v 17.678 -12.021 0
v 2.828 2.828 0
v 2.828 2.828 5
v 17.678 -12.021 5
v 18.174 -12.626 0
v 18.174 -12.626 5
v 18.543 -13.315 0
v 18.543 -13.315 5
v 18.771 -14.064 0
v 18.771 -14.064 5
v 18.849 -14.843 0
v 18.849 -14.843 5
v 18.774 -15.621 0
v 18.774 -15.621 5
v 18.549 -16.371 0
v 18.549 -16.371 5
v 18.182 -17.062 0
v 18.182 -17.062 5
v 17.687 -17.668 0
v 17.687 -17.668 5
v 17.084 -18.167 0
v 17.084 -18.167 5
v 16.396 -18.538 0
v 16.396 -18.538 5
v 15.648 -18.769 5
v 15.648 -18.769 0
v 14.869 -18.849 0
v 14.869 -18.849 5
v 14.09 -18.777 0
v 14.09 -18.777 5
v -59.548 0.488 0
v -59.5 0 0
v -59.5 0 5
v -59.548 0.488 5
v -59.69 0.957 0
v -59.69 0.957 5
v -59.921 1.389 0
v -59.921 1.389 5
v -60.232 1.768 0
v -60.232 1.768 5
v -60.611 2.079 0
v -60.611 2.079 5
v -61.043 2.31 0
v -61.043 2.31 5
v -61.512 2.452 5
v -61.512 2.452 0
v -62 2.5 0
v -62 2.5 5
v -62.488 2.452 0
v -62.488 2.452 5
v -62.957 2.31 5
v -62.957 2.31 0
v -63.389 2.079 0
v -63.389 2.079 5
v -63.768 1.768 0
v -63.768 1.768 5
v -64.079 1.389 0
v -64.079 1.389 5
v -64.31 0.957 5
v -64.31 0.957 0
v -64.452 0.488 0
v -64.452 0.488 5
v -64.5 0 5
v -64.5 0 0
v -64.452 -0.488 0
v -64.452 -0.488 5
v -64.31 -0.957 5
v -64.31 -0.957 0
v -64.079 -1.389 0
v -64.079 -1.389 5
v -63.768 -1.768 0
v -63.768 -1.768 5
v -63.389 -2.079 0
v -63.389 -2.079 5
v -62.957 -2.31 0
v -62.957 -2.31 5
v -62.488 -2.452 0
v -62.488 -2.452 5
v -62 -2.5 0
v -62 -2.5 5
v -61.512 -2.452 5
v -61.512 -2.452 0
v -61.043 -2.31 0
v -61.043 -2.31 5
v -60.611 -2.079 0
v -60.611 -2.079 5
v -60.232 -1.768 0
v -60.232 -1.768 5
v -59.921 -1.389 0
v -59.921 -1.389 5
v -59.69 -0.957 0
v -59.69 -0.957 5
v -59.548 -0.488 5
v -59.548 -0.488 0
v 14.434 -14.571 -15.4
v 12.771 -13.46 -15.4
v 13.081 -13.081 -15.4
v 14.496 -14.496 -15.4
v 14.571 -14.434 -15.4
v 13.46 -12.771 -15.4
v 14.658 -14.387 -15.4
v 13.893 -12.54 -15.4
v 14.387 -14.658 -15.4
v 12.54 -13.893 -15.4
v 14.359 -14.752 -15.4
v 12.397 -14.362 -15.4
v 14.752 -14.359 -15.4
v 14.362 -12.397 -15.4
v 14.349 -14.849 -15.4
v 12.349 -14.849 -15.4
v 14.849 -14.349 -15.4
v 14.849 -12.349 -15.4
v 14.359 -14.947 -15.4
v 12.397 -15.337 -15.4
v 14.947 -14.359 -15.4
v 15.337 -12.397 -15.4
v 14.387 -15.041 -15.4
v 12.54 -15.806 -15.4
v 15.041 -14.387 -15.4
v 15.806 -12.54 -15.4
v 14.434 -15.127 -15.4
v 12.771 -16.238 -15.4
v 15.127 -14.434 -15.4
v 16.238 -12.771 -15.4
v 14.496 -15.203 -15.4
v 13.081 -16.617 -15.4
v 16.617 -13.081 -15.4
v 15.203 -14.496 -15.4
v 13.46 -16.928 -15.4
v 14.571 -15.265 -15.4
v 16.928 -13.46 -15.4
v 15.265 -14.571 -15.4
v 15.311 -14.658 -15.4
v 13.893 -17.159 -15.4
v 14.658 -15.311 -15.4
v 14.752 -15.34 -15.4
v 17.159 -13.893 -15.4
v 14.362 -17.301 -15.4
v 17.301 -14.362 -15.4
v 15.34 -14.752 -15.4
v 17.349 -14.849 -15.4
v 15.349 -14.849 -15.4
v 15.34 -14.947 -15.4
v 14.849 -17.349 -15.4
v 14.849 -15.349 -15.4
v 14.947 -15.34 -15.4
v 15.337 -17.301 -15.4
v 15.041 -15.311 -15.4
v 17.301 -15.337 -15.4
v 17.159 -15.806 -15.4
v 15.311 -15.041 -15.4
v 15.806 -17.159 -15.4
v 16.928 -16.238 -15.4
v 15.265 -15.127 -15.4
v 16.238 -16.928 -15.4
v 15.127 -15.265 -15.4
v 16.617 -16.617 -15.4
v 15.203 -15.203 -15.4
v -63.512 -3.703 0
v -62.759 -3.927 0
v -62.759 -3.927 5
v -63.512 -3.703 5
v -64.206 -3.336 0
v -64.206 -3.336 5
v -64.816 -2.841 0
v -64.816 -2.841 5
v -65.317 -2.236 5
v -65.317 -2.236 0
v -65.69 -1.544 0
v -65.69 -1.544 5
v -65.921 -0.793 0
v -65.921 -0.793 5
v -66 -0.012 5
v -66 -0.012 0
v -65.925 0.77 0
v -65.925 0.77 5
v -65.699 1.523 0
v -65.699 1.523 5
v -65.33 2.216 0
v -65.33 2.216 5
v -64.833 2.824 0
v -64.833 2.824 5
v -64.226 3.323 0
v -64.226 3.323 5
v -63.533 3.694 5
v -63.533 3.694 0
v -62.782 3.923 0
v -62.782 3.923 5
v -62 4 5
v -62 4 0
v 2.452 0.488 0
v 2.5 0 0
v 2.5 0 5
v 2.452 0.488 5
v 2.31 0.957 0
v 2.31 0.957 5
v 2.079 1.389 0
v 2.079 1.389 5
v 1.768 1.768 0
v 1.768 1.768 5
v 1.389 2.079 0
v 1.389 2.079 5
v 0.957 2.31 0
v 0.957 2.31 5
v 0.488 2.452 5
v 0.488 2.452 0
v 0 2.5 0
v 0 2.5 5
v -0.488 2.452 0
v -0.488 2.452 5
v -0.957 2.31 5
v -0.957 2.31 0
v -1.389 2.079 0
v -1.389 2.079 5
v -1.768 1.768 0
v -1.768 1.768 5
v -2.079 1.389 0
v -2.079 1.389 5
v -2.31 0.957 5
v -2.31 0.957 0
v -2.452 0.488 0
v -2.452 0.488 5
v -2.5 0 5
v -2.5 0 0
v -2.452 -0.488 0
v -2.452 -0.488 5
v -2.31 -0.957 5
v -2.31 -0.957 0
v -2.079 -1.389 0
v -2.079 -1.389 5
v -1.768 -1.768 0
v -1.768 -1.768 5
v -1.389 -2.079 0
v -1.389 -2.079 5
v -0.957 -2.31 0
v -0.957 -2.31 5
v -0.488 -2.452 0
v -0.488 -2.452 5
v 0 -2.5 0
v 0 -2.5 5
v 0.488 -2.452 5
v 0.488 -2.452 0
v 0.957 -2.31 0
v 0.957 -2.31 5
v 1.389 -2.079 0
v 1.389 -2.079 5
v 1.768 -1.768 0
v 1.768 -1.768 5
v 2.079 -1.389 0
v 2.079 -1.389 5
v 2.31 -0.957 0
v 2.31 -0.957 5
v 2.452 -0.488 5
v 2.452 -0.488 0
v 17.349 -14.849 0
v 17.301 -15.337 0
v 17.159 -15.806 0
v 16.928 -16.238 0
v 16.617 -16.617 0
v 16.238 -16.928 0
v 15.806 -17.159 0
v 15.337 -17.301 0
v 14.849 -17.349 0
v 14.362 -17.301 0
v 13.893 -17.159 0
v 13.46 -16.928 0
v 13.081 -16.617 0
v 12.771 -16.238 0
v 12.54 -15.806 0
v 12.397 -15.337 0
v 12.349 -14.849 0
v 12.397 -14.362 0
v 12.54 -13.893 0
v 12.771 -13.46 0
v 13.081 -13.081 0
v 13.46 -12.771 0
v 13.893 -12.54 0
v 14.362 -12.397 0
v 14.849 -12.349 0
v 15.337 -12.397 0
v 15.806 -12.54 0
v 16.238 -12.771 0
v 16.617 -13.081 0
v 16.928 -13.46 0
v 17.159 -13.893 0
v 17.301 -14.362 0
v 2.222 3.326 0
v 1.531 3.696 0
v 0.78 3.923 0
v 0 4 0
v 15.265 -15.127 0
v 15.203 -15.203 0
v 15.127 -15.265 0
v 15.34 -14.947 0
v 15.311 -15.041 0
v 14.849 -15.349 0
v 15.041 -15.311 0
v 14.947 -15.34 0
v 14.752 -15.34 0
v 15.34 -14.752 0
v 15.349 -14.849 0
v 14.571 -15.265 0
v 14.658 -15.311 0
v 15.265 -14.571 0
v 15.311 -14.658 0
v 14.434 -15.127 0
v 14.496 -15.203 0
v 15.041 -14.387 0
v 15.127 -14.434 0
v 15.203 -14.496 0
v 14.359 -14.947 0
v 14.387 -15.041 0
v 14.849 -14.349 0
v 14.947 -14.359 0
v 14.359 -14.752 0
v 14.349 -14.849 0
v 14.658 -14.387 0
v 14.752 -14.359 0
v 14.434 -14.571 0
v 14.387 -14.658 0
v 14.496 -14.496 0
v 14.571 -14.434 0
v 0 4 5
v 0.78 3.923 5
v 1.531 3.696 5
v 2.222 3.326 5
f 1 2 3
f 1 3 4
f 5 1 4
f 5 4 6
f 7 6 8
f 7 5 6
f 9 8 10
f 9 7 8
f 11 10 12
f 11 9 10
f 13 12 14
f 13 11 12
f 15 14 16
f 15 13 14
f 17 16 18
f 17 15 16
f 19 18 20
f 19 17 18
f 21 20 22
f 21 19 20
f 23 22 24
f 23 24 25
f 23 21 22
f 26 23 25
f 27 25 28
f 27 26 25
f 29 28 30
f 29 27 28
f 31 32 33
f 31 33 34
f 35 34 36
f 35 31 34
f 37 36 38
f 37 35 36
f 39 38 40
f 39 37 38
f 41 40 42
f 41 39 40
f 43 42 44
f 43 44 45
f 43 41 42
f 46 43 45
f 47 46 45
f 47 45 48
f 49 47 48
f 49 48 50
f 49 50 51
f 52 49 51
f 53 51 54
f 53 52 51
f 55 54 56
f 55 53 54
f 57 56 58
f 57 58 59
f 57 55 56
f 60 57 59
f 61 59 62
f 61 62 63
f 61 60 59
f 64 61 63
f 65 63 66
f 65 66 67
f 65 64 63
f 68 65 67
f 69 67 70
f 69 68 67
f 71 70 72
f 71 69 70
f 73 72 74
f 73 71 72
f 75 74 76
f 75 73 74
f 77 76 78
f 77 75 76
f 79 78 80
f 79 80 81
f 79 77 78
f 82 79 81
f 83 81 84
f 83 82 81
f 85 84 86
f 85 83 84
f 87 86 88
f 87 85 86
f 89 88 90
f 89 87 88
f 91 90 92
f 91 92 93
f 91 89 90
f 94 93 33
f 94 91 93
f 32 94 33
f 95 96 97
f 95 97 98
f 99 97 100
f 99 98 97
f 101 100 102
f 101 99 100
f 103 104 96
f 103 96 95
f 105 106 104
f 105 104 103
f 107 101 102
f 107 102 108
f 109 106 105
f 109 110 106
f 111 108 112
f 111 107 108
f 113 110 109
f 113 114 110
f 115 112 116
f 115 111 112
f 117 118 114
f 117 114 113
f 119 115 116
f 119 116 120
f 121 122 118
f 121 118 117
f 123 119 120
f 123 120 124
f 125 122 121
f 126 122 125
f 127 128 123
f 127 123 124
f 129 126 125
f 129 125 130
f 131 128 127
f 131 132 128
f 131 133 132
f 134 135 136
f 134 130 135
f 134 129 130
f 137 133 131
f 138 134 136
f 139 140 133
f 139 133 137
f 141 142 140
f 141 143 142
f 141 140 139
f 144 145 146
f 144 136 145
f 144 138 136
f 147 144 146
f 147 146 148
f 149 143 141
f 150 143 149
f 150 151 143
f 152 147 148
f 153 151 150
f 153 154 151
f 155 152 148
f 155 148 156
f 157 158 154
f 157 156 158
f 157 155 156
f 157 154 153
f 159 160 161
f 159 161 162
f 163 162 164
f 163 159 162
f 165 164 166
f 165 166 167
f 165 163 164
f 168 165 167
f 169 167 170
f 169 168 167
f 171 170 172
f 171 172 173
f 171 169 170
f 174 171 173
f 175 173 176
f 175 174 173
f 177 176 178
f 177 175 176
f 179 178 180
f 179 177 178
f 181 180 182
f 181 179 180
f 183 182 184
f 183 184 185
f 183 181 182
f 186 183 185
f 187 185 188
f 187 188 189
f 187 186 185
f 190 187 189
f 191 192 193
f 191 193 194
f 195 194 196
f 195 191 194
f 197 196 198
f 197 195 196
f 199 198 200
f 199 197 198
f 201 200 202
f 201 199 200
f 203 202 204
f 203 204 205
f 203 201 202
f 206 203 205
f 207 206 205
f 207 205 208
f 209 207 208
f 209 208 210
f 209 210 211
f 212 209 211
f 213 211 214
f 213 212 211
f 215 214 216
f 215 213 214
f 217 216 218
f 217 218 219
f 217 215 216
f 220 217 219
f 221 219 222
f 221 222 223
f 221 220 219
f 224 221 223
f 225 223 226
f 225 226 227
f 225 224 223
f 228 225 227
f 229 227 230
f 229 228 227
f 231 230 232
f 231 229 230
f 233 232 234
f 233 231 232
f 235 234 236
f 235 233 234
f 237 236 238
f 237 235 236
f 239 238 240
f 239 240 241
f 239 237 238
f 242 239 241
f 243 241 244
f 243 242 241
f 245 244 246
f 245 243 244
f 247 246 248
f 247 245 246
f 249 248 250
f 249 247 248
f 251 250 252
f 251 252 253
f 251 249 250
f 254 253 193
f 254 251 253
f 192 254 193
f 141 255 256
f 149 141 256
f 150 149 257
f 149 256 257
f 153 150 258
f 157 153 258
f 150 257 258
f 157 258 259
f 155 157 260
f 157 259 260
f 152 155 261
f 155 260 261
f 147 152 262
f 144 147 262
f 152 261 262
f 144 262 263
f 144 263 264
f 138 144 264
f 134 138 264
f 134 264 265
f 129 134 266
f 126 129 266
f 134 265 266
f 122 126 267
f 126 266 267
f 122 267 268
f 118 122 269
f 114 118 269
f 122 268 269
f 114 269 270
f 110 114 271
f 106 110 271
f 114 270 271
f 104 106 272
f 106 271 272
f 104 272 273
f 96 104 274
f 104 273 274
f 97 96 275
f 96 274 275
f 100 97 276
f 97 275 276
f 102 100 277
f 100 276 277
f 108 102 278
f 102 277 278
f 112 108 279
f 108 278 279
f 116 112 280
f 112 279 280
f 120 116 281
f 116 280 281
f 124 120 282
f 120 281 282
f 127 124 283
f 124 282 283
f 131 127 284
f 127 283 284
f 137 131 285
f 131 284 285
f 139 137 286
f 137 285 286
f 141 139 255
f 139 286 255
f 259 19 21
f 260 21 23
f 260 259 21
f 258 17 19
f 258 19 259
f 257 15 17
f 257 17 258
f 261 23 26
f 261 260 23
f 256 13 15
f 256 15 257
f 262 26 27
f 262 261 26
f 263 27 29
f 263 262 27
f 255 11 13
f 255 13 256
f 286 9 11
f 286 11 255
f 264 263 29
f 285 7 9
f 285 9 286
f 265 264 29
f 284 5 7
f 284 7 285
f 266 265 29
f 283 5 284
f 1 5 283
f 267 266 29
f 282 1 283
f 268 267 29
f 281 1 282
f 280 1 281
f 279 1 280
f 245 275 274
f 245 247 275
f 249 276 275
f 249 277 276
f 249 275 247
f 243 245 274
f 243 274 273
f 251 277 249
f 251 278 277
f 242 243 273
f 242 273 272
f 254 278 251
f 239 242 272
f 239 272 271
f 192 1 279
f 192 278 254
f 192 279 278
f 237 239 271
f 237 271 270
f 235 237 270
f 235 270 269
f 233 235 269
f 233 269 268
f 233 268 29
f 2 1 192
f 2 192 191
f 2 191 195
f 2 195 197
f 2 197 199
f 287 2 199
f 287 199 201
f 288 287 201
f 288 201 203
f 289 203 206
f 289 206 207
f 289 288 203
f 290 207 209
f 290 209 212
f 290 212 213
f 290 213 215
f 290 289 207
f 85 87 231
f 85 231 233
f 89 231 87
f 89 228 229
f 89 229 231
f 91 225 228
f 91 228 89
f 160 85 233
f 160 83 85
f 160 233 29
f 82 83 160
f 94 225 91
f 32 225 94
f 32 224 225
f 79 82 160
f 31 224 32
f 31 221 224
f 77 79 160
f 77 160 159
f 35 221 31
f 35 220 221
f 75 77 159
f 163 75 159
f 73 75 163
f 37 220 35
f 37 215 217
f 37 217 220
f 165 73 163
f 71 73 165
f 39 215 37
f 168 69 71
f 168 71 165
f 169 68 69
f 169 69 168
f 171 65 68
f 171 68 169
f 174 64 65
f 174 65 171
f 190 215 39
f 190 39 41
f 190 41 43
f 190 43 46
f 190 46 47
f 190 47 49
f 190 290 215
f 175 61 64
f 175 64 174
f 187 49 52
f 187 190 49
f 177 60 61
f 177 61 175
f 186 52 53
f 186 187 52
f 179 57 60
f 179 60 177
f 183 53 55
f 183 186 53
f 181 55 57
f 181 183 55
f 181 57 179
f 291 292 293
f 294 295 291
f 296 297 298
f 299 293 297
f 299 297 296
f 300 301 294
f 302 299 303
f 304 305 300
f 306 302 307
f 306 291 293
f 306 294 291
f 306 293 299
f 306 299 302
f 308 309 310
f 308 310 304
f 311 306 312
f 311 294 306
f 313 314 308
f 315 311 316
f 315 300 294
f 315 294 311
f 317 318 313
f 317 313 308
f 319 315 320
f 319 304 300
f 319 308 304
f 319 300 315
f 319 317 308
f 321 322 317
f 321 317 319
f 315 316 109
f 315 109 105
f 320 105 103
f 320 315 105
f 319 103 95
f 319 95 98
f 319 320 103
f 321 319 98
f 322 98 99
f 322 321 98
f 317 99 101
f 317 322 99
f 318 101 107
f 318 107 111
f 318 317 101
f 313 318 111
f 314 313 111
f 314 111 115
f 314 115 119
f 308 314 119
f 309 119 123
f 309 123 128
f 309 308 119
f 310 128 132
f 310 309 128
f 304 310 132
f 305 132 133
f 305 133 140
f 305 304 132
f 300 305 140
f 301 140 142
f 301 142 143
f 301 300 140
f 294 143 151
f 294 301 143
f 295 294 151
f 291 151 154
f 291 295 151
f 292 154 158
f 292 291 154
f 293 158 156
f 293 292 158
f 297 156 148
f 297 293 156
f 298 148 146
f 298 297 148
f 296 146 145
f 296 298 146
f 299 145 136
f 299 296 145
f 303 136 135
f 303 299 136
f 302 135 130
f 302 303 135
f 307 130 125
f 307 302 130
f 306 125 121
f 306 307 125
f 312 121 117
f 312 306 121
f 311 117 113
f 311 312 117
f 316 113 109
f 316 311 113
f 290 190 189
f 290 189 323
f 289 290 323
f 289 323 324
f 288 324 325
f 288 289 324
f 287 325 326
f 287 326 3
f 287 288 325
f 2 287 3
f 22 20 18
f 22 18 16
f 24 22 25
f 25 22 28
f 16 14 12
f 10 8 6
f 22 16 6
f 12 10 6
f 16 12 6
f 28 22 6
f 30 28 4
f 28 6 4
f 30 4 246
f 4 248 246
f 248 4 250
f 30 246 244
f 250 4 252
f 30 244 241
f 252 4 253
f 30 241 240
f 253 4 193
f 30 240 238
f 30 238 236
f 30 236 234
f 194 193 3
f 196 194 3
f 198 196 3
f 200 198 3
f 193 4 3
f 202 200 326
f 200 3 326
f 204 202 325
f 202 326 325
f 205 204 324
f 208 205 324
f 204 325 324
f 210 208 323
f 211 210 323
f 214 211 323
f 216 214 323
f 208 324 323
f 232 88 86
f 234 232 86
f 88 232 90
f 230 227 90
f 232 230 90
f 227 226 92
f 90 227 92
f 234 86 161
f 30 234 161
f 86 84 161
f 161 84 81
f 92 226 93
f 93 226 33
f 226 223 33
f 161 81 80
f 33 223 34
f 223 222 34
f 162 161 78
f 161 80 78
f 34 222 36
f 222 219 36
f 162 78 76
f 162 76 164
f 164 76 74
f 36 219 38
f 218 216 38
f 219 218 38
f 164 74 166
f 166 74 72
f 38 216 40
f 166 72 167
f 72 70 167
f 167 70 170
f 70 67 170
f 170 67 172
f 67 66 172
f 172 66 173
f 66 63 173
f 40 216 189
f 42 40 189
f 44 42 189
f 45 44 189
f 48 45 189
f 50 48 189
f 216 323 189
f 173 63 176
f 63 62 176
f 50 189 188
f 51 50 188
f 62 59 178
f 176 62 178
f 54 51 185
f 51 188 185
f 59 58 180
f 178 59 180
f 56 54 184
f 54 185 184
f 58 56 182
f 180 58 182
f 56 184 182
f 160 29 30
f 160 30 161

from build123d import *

# Parameters (mm, degrees)
SKETCH2_R           = 2.5
BOSS_EXTRUDE1_DEPTH = 5
SKETCH3_R           = 2.5
SKETCH3_R_2         = 0.5
BOSS_EXTRUDE2_DEPTH = 15.4


with BuildPart() as part:
    # Sketch2 → Boss-Extrude1 (new body)
    with BuildSketch(Plane.XY):
        with BuildLine():
            Line((-62, 4), (0, 4))
            ThreePointArc((0, 4), (1.530733729, 3.69551813), (2.828427125, 2.828427125))
            Line((2.828427125, 2.828427125), (17.67766953, -12.02081528))
            ThreePointArc((17.67766953, -12.02081528), (18.382077171, -16.725163117), (14.09037667, -18.776598105))
            Line((14.09037667, -18.776598105), (-62.758865735, -3.9273557))
            ThreePointArc((-62.758865735, -3.9273557), (-65.981797509, 0.381167417), (-62, 4))
        make_face()
        with Locations((-62, 0)):
            Circle(SKETCH2_R, mode=Mode.SUBTRACT)
        Circle(SKETCH2_R, mode=Mode.SUBTRACT)
    extrude(amount=BOSS_EXTRUDE1_DEPTH)

    # Sketch3 → Boss-Extrude2 (add)
    with BuildSketch(Plane(origin=(0, 0, 0), x_dir=(-1, 0, 0), z_dir=(0, 0, -1))):
        with Locations(Location((-14.849242405, -14.849242405, 0), (0, 0, 180))):
            Circle(SKETCH3_R)
        with Locations((-14.849242405, -14.849242405)):
            Circle(SKETCH3_R_2, mode=Mode.SUBTRACT)
    extrude(amount=BOSS_EXTRUDE2_DEPTH)


solid = part.part
